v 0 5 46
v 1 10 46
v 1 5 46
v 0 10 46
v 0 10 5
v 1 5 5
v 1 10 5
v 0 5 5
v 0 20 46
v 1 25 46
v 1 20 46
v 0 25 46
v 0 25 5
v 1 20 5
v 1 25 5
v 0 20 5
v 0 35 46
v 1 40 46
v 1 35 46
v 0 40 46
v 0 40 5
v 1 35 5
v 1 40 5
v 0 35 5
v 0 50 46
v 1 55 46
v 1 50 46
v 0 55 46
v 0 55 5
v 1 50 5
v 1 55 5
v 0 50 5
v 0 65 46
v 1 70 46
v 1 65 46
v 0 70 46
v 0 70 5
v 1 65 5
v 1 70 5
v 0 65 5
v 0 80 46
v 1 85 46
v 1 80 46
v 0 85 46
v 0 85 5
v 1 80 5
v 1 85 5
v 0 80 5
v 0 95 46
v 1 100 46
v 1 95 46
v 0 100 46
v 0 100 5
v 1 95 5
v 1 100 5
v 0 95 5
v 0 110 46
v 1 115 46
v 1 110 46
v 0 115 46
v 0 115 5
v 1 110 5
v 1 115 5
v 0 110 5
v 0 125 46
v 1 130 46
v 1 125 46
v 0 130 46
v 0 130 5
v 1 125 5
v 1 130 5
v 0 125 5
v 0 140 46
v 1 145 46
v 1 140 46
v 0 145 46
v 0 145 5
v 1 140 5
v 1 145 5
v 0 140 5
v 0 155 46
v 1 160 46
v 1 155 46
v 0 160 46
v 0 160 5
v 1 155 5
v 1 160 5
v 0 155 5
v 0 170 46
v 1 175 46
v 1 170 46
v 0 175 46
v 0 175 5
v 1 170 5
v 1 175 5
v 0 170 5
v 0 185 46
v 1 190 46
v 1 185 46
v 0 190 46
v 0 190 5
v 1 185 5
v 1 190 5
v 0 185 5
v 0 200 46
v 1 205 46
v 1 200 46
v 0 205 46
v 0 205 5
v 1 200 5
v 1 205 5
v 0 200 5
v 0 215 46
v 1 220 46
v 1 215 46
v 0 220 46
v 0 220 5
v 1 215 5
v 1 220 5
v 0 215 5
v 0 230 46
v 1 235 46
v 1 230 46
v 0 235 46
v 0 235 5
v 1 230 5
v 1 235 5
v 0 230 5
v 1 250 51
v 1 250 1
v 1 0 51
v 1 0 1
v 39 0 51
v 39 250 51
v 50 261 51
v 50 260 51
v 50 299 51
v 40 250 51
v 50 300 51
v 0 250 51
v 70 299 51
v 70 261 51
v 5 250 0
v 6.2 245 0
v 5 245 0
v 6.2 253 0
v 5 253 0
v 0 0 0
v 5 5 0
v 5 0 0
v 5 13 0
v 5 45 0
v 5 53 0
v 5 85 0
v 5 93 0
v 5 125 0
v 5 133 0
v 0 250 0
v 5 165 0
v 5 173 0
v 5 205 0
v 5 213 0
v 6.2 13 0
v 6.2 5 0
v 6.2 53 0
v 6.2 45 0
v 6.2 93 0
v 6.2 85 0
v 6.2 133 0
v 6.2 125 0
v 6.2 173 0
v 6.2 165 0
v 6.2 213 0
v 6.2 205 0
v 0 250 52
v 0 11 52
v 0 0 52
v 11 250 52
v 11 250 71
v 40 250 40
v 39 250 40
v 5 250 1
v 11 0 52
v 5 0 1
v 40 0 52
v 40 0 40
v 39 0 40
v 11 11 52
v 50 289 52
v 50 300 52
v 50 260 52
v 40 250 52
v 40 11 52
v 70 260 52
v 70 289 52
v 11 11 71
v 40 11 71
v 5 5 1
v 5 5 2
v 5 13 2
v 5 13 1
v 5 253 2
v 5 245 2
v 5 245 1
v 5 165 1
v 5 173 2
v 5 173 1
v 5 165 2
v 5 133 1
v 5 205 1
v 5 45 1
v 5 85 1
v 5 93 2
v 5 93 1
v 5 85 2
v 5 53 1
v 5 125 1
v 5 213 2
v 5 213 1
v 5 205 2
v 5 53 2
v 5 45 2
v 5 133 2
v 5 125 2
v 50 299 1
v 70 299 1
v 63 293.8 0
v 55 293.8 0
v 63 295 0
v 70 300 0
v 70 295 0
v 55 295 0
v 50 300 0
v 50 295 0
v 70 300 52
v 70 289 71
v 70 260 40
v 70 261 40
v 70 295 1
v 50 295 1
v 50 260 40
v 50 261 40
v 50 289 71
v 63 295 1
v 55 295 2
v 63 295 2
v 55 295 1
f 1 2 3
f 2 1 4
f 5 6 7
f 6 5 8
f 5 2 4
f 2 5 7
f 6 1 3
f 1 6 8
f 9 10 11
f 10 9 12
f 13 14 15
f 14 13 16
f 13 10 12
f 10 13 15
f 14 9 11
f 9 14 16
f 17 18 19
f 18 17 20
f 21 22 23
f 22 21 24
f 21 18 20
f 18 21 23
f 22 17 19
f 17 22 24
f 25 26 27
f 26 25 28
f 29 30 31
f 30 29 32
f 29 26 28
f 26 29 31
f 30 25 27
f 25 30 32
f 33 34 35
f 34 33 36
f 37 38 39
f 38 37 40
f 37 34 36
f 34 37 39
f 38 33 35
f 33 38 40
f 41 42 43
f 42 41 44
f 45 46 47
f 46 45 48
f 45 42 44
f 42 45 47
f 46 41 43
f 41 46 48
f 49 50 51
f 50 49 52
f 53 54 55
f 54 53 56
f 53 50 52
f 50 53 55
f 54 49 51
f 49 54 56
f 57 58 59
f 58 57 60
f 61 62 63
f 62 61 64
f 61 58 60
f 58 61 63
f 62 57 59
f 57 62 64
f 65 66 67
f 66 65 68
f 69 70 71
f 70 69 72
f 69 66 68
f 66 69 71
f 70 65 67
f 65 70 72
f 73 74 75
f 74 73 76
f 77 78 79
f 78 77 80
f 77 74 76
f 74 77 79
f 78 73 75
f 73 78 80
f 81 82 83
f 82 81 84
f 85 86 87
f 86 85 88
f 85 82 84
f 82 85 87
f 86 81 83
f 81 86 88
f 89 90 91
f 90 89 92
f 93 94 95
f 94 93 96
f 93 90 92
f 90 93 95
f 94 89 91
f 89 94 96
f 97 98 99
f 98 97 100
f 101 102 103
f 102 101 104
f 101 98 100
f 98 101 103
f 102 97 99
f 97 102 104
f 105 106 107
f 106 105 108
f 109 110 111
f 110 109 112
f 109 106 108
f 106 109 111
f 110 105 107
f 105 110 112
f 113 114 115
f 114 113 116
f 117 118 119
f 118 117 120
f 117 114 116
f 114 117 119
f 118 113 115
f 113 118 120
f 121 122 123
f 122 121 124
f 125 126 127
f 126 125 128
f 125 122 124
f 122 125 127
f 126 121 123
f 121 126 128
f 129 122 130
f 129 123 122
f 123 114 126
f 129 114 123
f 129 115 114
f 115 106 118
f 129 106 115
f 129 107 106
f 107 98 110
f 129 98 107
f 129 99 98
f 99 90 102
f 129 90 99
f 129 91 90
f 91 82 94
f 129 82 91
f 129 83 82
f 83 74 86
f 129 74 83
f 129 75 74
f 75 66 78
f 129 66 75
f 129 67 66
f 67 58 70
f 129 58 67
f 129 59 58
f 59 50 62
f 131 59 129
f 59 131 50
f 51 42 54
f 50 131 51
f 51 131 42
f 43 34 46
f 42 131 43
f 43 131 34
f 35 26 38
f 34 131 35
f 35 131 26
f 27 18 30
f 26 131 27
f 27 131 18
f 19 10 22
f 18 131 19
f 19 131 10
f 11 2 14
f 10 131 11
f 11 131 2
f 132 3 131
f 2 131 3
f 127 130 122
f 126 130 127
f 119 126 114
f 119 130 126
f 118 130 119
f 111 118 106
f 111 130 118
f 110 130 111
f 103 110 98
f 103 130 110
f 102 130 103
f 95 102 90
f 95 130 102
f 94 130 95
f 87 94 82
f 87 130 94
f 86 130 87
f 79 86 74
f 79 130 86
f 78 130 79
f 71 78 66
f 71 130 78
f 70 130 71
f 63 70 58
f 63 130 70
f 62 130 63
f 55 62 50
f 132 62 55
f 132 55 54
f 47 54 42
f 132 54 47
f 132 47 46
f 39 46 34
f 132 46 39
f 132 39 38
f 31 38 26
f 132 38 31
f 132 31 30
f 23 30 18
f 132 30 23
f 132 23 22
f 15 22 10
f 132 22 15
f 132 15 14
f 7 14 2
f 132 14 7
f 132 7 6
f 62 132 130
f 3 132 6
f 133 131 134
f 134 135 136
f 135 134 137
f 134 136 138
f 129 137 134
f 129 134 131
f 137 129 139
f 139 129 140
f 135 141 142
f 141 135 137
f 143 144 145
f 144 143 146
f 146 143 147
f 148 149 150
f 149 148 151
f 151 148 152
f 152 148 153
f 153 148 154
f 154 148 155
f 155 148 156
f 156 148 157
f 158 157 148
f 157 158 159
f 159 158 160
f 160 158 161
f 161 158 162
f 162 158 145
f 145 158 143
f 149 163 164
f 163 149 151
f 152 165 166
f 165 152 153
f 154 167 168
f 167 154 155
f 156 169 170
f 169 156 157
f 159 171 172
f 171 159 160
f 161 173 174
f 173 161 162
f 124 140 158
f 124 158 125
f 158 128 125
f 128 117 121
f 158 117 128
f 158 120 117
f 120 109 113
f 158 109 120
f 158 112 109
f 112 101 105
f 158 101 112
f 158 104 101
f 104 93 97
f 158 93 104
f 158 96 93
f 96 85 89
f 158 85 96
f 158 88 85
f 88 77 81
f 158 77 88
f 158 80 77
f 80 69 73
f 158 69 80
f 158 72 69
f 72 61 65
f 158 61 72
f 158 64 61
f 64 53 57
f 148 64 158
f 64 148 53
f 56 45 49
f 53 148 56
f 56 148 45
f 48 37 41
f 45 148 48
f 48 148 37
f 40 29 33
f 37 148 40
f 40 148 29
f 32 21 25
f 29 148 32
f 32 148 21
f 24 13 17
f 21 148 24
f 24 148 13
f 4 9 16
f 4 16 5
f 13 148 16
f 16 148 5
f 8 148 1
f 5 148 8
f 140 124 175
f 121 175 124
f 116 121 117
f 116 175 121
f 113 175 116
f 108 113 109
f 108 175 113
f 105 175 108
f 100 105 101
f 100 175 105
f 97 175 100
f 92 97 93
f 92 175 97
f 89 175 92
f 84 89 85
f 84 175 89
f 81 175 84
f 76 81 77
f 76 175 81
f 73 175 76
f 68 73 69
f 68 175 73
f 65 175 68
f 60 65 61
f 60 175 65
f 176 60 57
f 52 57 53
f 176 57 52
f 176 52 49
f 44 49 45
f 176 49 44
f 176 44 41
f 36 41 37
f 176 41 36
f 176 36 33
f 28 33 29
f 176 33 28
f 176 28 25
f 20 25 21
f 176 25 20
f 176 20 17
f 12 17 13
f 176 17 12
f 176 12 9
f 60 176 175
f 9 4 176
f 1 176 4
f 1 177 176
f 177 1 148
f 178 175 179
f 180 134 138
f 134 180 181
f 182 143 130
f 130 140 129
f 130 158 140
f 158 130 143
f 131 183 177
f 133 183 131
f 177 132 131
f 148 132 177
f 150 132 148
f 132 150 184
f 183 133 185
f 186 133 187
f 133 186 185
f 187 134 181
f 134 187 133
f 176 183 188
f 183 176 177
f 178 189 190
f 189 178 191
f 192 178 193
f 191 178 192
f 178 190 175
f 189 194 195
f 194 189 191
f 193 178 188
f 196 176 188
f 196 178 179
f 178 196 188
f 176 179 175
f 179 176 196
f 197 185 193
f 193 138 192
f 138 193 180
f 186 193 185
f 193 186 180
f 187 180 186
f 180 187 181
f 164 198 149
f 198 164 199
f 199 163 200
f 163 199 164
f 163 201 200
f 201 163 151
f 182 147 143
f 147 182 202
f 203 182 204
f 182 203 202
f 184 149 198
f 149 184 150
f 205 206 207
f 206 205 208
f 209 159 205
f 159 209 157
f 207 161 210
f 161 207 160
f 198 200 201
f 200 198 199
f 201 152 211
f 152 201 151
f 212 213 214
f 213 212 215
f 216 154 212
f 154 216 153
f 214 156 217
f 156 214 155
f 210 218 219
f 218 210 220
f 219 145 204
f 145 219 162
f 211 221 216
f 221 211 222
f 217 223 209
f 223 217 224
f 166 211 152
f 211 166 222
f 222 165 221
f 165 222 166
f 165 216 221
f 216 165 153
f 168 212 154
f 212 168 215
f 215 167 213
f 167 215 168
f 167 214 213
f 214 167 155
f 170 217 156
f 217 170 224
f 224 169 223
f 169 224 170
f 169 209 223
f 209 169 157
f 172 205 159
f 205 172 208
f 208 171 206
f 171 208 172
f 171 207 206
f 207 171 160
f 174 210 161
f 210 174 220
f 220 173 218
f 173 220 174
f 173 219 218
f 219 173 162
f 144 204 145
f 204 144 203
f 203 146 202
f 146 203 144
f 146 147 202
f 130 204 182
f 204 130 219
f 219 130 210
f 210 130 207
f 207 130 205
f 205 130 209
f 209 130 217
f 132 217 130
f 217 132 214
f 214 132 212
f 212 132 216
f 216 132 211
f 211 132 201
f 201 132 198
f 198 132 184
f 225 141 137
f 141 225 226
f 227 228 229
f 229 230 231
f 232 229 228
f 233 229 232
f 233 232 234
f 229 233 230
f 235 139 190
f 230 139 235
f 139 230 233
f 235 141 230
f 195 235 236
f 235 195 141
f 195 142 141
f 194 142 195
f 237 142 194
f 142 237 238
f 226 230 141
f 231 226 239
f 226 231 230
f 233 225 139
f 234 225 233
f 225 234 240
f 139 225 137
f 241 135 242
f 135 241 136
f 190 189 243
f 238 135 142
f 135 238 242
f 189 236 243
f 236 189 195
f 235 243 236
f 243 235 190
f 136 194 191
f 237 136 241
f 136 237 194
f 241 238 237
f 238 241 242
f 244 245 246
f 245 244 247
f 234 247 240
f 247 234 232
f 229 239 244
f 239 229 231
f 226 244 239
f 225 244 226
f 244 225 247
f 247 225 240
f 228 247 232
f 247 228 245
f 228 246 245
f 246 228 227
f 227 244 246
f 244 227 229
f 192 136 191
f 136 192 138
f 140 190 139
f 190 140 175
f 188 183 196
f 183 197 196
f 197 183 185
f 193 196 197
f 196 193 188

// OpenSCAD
// file: prism.scad
//CC-BY-SA
//https://github.com/dannystaple/OpenSCAD-Parts-Library
//Draw a prism based on a 
//right angled triangle
//l - length of prism
//w - width of triangle
//h - height of triangle
module prism(l, w, h) {
       polyhedron(points=[
               [0,0,h],           // 0    front top corner
               [0,0,0],[w,0,0],   // 1, 2 front left & right bottom corners
               [0,l,h],           // 3    back top corner
               [0,l,0],[w,l,0]    // 4, 5 back left & right bottom corners
       ], faces=[ // points for all faces must be ordered clockwise when looking in
               [0,2,1],    // top face
               [3,4,5],    // base face
               [0,1,4,3],  // h face
               [1,2,5,4],  // w face
               [0,3,5,2],  // hypotenuse face
       ]);
}

prism(5, 3, 2);
// main file
/*
Sortera box cover constraints
*/
innerElevationDifference=12;
elevationWidth=38;
totalHeight=51;
materialWidth=1;
innerEdgeRadius=10;
outerEdgeRadius=40;
cover2MainbodyGap=4;
/*
400*300 Euro box bottom constraints
*/
stackProfileMargin=11;
euroDepth=300-(innerEdgeRadius+outerEdgeRadius);
euroWidth=400;
/*
Mount constraints
*/
materialThickness=1;

use <prism.scad>;

module sideElement(depth, isMain) {
    //sidecover
    difference() {
    cube([materialWidth,depth,totalHeight]);
        for(i = [5:15:depth-20]) {
            translate([-1,i,5])  cube([materialWidth+2,5,totalHeight-10]);
        }
    }
    //elevation cover w/ latch
    translate([0,0,totalHeight]) {
        cube([elevationWidth+materialWidth,
            depth,materialWidth]);
        
        if(isMain) {
            translate([stackProfileMargin,stackProfileMargin,materialWidth]) mirror([1,0,0]) prism(depth-stackProfileMargin,stackProfileMargin,19);
        } else {
            translate([stackProfileMargin,0,materialWidth]) mirror([1,0,0]) prism(depth,stackProfileMargin,19);
        }
        
        translate([elevationWidth+materialWidth,
            0,(-innerElevationDifference)+materialWidth]) {
            cube([materialWidth,depth,
                innerElevationDifference]);
        }
        
    }
    cube([cover2MainbodyGap+materialWidth,depth,materialWidth]);
    for(i = [5:40:depth]) {
        translate([cover2MainbodyGap+materialWidth,i,0]) {
            prism(8,1.2,2);
        }
    }
}

module edgeElement(length) {
    CubePoints = [
  [  0,  0,  0 ],  //0
  [ outerEdgeRadius,  0,  0 ],  //1
  [ outerEdgeRadius+innerEdgeRadius,  innerEdgeRadius,  0 ],  //2
  [  outerEdgeRadius+innerEdgeRadius,  outerEdgeRadius+innerEdgeRadius,  0 ],  //3
  [  0,  0,  materialWidth ],  //4
  [ outerEdgeRadius,  0,  materialWidth ],  //5
  [ outerEdgeRadius+innerEdgeRadius,  innerEdgeRadius,  materialWidth ],  //6
  [  outerEdgeRadius+innerEdgeRadius,  outerEdgeRadius+innerEdgeRadius,  materialWidth ]]; //7
  
CubeFaces = [
  [0,1,2,3],  // bottom
  [4,5,1,0],  // front
  [7,6,5,4],  // top
  [5,6,2,1],  // right
  [6,7,3,2],  // back
  [7,4,0,3]]; // left
  
polyhedron( CubePoints, CubeFaces );
    
}

sideElement(euroDepth, true);
translate([0,euroDepth,totalHeight])  edgeElement();
translate([outerEdgeRadius+innerEdgeRadius, euroDepth+innerEdgeRadius+ elevationWidth+materialWidth*2,0]) rotate([0,0,-90]) sideElement(20);

translate([stackProfileMargin,stackProfileMargin,totalHeight+materialWidth]) rotate([0,0,-90]) prism((elevationWidth-stackProfileMargin)+materialWidth*2,stackProfileMargin,19);
